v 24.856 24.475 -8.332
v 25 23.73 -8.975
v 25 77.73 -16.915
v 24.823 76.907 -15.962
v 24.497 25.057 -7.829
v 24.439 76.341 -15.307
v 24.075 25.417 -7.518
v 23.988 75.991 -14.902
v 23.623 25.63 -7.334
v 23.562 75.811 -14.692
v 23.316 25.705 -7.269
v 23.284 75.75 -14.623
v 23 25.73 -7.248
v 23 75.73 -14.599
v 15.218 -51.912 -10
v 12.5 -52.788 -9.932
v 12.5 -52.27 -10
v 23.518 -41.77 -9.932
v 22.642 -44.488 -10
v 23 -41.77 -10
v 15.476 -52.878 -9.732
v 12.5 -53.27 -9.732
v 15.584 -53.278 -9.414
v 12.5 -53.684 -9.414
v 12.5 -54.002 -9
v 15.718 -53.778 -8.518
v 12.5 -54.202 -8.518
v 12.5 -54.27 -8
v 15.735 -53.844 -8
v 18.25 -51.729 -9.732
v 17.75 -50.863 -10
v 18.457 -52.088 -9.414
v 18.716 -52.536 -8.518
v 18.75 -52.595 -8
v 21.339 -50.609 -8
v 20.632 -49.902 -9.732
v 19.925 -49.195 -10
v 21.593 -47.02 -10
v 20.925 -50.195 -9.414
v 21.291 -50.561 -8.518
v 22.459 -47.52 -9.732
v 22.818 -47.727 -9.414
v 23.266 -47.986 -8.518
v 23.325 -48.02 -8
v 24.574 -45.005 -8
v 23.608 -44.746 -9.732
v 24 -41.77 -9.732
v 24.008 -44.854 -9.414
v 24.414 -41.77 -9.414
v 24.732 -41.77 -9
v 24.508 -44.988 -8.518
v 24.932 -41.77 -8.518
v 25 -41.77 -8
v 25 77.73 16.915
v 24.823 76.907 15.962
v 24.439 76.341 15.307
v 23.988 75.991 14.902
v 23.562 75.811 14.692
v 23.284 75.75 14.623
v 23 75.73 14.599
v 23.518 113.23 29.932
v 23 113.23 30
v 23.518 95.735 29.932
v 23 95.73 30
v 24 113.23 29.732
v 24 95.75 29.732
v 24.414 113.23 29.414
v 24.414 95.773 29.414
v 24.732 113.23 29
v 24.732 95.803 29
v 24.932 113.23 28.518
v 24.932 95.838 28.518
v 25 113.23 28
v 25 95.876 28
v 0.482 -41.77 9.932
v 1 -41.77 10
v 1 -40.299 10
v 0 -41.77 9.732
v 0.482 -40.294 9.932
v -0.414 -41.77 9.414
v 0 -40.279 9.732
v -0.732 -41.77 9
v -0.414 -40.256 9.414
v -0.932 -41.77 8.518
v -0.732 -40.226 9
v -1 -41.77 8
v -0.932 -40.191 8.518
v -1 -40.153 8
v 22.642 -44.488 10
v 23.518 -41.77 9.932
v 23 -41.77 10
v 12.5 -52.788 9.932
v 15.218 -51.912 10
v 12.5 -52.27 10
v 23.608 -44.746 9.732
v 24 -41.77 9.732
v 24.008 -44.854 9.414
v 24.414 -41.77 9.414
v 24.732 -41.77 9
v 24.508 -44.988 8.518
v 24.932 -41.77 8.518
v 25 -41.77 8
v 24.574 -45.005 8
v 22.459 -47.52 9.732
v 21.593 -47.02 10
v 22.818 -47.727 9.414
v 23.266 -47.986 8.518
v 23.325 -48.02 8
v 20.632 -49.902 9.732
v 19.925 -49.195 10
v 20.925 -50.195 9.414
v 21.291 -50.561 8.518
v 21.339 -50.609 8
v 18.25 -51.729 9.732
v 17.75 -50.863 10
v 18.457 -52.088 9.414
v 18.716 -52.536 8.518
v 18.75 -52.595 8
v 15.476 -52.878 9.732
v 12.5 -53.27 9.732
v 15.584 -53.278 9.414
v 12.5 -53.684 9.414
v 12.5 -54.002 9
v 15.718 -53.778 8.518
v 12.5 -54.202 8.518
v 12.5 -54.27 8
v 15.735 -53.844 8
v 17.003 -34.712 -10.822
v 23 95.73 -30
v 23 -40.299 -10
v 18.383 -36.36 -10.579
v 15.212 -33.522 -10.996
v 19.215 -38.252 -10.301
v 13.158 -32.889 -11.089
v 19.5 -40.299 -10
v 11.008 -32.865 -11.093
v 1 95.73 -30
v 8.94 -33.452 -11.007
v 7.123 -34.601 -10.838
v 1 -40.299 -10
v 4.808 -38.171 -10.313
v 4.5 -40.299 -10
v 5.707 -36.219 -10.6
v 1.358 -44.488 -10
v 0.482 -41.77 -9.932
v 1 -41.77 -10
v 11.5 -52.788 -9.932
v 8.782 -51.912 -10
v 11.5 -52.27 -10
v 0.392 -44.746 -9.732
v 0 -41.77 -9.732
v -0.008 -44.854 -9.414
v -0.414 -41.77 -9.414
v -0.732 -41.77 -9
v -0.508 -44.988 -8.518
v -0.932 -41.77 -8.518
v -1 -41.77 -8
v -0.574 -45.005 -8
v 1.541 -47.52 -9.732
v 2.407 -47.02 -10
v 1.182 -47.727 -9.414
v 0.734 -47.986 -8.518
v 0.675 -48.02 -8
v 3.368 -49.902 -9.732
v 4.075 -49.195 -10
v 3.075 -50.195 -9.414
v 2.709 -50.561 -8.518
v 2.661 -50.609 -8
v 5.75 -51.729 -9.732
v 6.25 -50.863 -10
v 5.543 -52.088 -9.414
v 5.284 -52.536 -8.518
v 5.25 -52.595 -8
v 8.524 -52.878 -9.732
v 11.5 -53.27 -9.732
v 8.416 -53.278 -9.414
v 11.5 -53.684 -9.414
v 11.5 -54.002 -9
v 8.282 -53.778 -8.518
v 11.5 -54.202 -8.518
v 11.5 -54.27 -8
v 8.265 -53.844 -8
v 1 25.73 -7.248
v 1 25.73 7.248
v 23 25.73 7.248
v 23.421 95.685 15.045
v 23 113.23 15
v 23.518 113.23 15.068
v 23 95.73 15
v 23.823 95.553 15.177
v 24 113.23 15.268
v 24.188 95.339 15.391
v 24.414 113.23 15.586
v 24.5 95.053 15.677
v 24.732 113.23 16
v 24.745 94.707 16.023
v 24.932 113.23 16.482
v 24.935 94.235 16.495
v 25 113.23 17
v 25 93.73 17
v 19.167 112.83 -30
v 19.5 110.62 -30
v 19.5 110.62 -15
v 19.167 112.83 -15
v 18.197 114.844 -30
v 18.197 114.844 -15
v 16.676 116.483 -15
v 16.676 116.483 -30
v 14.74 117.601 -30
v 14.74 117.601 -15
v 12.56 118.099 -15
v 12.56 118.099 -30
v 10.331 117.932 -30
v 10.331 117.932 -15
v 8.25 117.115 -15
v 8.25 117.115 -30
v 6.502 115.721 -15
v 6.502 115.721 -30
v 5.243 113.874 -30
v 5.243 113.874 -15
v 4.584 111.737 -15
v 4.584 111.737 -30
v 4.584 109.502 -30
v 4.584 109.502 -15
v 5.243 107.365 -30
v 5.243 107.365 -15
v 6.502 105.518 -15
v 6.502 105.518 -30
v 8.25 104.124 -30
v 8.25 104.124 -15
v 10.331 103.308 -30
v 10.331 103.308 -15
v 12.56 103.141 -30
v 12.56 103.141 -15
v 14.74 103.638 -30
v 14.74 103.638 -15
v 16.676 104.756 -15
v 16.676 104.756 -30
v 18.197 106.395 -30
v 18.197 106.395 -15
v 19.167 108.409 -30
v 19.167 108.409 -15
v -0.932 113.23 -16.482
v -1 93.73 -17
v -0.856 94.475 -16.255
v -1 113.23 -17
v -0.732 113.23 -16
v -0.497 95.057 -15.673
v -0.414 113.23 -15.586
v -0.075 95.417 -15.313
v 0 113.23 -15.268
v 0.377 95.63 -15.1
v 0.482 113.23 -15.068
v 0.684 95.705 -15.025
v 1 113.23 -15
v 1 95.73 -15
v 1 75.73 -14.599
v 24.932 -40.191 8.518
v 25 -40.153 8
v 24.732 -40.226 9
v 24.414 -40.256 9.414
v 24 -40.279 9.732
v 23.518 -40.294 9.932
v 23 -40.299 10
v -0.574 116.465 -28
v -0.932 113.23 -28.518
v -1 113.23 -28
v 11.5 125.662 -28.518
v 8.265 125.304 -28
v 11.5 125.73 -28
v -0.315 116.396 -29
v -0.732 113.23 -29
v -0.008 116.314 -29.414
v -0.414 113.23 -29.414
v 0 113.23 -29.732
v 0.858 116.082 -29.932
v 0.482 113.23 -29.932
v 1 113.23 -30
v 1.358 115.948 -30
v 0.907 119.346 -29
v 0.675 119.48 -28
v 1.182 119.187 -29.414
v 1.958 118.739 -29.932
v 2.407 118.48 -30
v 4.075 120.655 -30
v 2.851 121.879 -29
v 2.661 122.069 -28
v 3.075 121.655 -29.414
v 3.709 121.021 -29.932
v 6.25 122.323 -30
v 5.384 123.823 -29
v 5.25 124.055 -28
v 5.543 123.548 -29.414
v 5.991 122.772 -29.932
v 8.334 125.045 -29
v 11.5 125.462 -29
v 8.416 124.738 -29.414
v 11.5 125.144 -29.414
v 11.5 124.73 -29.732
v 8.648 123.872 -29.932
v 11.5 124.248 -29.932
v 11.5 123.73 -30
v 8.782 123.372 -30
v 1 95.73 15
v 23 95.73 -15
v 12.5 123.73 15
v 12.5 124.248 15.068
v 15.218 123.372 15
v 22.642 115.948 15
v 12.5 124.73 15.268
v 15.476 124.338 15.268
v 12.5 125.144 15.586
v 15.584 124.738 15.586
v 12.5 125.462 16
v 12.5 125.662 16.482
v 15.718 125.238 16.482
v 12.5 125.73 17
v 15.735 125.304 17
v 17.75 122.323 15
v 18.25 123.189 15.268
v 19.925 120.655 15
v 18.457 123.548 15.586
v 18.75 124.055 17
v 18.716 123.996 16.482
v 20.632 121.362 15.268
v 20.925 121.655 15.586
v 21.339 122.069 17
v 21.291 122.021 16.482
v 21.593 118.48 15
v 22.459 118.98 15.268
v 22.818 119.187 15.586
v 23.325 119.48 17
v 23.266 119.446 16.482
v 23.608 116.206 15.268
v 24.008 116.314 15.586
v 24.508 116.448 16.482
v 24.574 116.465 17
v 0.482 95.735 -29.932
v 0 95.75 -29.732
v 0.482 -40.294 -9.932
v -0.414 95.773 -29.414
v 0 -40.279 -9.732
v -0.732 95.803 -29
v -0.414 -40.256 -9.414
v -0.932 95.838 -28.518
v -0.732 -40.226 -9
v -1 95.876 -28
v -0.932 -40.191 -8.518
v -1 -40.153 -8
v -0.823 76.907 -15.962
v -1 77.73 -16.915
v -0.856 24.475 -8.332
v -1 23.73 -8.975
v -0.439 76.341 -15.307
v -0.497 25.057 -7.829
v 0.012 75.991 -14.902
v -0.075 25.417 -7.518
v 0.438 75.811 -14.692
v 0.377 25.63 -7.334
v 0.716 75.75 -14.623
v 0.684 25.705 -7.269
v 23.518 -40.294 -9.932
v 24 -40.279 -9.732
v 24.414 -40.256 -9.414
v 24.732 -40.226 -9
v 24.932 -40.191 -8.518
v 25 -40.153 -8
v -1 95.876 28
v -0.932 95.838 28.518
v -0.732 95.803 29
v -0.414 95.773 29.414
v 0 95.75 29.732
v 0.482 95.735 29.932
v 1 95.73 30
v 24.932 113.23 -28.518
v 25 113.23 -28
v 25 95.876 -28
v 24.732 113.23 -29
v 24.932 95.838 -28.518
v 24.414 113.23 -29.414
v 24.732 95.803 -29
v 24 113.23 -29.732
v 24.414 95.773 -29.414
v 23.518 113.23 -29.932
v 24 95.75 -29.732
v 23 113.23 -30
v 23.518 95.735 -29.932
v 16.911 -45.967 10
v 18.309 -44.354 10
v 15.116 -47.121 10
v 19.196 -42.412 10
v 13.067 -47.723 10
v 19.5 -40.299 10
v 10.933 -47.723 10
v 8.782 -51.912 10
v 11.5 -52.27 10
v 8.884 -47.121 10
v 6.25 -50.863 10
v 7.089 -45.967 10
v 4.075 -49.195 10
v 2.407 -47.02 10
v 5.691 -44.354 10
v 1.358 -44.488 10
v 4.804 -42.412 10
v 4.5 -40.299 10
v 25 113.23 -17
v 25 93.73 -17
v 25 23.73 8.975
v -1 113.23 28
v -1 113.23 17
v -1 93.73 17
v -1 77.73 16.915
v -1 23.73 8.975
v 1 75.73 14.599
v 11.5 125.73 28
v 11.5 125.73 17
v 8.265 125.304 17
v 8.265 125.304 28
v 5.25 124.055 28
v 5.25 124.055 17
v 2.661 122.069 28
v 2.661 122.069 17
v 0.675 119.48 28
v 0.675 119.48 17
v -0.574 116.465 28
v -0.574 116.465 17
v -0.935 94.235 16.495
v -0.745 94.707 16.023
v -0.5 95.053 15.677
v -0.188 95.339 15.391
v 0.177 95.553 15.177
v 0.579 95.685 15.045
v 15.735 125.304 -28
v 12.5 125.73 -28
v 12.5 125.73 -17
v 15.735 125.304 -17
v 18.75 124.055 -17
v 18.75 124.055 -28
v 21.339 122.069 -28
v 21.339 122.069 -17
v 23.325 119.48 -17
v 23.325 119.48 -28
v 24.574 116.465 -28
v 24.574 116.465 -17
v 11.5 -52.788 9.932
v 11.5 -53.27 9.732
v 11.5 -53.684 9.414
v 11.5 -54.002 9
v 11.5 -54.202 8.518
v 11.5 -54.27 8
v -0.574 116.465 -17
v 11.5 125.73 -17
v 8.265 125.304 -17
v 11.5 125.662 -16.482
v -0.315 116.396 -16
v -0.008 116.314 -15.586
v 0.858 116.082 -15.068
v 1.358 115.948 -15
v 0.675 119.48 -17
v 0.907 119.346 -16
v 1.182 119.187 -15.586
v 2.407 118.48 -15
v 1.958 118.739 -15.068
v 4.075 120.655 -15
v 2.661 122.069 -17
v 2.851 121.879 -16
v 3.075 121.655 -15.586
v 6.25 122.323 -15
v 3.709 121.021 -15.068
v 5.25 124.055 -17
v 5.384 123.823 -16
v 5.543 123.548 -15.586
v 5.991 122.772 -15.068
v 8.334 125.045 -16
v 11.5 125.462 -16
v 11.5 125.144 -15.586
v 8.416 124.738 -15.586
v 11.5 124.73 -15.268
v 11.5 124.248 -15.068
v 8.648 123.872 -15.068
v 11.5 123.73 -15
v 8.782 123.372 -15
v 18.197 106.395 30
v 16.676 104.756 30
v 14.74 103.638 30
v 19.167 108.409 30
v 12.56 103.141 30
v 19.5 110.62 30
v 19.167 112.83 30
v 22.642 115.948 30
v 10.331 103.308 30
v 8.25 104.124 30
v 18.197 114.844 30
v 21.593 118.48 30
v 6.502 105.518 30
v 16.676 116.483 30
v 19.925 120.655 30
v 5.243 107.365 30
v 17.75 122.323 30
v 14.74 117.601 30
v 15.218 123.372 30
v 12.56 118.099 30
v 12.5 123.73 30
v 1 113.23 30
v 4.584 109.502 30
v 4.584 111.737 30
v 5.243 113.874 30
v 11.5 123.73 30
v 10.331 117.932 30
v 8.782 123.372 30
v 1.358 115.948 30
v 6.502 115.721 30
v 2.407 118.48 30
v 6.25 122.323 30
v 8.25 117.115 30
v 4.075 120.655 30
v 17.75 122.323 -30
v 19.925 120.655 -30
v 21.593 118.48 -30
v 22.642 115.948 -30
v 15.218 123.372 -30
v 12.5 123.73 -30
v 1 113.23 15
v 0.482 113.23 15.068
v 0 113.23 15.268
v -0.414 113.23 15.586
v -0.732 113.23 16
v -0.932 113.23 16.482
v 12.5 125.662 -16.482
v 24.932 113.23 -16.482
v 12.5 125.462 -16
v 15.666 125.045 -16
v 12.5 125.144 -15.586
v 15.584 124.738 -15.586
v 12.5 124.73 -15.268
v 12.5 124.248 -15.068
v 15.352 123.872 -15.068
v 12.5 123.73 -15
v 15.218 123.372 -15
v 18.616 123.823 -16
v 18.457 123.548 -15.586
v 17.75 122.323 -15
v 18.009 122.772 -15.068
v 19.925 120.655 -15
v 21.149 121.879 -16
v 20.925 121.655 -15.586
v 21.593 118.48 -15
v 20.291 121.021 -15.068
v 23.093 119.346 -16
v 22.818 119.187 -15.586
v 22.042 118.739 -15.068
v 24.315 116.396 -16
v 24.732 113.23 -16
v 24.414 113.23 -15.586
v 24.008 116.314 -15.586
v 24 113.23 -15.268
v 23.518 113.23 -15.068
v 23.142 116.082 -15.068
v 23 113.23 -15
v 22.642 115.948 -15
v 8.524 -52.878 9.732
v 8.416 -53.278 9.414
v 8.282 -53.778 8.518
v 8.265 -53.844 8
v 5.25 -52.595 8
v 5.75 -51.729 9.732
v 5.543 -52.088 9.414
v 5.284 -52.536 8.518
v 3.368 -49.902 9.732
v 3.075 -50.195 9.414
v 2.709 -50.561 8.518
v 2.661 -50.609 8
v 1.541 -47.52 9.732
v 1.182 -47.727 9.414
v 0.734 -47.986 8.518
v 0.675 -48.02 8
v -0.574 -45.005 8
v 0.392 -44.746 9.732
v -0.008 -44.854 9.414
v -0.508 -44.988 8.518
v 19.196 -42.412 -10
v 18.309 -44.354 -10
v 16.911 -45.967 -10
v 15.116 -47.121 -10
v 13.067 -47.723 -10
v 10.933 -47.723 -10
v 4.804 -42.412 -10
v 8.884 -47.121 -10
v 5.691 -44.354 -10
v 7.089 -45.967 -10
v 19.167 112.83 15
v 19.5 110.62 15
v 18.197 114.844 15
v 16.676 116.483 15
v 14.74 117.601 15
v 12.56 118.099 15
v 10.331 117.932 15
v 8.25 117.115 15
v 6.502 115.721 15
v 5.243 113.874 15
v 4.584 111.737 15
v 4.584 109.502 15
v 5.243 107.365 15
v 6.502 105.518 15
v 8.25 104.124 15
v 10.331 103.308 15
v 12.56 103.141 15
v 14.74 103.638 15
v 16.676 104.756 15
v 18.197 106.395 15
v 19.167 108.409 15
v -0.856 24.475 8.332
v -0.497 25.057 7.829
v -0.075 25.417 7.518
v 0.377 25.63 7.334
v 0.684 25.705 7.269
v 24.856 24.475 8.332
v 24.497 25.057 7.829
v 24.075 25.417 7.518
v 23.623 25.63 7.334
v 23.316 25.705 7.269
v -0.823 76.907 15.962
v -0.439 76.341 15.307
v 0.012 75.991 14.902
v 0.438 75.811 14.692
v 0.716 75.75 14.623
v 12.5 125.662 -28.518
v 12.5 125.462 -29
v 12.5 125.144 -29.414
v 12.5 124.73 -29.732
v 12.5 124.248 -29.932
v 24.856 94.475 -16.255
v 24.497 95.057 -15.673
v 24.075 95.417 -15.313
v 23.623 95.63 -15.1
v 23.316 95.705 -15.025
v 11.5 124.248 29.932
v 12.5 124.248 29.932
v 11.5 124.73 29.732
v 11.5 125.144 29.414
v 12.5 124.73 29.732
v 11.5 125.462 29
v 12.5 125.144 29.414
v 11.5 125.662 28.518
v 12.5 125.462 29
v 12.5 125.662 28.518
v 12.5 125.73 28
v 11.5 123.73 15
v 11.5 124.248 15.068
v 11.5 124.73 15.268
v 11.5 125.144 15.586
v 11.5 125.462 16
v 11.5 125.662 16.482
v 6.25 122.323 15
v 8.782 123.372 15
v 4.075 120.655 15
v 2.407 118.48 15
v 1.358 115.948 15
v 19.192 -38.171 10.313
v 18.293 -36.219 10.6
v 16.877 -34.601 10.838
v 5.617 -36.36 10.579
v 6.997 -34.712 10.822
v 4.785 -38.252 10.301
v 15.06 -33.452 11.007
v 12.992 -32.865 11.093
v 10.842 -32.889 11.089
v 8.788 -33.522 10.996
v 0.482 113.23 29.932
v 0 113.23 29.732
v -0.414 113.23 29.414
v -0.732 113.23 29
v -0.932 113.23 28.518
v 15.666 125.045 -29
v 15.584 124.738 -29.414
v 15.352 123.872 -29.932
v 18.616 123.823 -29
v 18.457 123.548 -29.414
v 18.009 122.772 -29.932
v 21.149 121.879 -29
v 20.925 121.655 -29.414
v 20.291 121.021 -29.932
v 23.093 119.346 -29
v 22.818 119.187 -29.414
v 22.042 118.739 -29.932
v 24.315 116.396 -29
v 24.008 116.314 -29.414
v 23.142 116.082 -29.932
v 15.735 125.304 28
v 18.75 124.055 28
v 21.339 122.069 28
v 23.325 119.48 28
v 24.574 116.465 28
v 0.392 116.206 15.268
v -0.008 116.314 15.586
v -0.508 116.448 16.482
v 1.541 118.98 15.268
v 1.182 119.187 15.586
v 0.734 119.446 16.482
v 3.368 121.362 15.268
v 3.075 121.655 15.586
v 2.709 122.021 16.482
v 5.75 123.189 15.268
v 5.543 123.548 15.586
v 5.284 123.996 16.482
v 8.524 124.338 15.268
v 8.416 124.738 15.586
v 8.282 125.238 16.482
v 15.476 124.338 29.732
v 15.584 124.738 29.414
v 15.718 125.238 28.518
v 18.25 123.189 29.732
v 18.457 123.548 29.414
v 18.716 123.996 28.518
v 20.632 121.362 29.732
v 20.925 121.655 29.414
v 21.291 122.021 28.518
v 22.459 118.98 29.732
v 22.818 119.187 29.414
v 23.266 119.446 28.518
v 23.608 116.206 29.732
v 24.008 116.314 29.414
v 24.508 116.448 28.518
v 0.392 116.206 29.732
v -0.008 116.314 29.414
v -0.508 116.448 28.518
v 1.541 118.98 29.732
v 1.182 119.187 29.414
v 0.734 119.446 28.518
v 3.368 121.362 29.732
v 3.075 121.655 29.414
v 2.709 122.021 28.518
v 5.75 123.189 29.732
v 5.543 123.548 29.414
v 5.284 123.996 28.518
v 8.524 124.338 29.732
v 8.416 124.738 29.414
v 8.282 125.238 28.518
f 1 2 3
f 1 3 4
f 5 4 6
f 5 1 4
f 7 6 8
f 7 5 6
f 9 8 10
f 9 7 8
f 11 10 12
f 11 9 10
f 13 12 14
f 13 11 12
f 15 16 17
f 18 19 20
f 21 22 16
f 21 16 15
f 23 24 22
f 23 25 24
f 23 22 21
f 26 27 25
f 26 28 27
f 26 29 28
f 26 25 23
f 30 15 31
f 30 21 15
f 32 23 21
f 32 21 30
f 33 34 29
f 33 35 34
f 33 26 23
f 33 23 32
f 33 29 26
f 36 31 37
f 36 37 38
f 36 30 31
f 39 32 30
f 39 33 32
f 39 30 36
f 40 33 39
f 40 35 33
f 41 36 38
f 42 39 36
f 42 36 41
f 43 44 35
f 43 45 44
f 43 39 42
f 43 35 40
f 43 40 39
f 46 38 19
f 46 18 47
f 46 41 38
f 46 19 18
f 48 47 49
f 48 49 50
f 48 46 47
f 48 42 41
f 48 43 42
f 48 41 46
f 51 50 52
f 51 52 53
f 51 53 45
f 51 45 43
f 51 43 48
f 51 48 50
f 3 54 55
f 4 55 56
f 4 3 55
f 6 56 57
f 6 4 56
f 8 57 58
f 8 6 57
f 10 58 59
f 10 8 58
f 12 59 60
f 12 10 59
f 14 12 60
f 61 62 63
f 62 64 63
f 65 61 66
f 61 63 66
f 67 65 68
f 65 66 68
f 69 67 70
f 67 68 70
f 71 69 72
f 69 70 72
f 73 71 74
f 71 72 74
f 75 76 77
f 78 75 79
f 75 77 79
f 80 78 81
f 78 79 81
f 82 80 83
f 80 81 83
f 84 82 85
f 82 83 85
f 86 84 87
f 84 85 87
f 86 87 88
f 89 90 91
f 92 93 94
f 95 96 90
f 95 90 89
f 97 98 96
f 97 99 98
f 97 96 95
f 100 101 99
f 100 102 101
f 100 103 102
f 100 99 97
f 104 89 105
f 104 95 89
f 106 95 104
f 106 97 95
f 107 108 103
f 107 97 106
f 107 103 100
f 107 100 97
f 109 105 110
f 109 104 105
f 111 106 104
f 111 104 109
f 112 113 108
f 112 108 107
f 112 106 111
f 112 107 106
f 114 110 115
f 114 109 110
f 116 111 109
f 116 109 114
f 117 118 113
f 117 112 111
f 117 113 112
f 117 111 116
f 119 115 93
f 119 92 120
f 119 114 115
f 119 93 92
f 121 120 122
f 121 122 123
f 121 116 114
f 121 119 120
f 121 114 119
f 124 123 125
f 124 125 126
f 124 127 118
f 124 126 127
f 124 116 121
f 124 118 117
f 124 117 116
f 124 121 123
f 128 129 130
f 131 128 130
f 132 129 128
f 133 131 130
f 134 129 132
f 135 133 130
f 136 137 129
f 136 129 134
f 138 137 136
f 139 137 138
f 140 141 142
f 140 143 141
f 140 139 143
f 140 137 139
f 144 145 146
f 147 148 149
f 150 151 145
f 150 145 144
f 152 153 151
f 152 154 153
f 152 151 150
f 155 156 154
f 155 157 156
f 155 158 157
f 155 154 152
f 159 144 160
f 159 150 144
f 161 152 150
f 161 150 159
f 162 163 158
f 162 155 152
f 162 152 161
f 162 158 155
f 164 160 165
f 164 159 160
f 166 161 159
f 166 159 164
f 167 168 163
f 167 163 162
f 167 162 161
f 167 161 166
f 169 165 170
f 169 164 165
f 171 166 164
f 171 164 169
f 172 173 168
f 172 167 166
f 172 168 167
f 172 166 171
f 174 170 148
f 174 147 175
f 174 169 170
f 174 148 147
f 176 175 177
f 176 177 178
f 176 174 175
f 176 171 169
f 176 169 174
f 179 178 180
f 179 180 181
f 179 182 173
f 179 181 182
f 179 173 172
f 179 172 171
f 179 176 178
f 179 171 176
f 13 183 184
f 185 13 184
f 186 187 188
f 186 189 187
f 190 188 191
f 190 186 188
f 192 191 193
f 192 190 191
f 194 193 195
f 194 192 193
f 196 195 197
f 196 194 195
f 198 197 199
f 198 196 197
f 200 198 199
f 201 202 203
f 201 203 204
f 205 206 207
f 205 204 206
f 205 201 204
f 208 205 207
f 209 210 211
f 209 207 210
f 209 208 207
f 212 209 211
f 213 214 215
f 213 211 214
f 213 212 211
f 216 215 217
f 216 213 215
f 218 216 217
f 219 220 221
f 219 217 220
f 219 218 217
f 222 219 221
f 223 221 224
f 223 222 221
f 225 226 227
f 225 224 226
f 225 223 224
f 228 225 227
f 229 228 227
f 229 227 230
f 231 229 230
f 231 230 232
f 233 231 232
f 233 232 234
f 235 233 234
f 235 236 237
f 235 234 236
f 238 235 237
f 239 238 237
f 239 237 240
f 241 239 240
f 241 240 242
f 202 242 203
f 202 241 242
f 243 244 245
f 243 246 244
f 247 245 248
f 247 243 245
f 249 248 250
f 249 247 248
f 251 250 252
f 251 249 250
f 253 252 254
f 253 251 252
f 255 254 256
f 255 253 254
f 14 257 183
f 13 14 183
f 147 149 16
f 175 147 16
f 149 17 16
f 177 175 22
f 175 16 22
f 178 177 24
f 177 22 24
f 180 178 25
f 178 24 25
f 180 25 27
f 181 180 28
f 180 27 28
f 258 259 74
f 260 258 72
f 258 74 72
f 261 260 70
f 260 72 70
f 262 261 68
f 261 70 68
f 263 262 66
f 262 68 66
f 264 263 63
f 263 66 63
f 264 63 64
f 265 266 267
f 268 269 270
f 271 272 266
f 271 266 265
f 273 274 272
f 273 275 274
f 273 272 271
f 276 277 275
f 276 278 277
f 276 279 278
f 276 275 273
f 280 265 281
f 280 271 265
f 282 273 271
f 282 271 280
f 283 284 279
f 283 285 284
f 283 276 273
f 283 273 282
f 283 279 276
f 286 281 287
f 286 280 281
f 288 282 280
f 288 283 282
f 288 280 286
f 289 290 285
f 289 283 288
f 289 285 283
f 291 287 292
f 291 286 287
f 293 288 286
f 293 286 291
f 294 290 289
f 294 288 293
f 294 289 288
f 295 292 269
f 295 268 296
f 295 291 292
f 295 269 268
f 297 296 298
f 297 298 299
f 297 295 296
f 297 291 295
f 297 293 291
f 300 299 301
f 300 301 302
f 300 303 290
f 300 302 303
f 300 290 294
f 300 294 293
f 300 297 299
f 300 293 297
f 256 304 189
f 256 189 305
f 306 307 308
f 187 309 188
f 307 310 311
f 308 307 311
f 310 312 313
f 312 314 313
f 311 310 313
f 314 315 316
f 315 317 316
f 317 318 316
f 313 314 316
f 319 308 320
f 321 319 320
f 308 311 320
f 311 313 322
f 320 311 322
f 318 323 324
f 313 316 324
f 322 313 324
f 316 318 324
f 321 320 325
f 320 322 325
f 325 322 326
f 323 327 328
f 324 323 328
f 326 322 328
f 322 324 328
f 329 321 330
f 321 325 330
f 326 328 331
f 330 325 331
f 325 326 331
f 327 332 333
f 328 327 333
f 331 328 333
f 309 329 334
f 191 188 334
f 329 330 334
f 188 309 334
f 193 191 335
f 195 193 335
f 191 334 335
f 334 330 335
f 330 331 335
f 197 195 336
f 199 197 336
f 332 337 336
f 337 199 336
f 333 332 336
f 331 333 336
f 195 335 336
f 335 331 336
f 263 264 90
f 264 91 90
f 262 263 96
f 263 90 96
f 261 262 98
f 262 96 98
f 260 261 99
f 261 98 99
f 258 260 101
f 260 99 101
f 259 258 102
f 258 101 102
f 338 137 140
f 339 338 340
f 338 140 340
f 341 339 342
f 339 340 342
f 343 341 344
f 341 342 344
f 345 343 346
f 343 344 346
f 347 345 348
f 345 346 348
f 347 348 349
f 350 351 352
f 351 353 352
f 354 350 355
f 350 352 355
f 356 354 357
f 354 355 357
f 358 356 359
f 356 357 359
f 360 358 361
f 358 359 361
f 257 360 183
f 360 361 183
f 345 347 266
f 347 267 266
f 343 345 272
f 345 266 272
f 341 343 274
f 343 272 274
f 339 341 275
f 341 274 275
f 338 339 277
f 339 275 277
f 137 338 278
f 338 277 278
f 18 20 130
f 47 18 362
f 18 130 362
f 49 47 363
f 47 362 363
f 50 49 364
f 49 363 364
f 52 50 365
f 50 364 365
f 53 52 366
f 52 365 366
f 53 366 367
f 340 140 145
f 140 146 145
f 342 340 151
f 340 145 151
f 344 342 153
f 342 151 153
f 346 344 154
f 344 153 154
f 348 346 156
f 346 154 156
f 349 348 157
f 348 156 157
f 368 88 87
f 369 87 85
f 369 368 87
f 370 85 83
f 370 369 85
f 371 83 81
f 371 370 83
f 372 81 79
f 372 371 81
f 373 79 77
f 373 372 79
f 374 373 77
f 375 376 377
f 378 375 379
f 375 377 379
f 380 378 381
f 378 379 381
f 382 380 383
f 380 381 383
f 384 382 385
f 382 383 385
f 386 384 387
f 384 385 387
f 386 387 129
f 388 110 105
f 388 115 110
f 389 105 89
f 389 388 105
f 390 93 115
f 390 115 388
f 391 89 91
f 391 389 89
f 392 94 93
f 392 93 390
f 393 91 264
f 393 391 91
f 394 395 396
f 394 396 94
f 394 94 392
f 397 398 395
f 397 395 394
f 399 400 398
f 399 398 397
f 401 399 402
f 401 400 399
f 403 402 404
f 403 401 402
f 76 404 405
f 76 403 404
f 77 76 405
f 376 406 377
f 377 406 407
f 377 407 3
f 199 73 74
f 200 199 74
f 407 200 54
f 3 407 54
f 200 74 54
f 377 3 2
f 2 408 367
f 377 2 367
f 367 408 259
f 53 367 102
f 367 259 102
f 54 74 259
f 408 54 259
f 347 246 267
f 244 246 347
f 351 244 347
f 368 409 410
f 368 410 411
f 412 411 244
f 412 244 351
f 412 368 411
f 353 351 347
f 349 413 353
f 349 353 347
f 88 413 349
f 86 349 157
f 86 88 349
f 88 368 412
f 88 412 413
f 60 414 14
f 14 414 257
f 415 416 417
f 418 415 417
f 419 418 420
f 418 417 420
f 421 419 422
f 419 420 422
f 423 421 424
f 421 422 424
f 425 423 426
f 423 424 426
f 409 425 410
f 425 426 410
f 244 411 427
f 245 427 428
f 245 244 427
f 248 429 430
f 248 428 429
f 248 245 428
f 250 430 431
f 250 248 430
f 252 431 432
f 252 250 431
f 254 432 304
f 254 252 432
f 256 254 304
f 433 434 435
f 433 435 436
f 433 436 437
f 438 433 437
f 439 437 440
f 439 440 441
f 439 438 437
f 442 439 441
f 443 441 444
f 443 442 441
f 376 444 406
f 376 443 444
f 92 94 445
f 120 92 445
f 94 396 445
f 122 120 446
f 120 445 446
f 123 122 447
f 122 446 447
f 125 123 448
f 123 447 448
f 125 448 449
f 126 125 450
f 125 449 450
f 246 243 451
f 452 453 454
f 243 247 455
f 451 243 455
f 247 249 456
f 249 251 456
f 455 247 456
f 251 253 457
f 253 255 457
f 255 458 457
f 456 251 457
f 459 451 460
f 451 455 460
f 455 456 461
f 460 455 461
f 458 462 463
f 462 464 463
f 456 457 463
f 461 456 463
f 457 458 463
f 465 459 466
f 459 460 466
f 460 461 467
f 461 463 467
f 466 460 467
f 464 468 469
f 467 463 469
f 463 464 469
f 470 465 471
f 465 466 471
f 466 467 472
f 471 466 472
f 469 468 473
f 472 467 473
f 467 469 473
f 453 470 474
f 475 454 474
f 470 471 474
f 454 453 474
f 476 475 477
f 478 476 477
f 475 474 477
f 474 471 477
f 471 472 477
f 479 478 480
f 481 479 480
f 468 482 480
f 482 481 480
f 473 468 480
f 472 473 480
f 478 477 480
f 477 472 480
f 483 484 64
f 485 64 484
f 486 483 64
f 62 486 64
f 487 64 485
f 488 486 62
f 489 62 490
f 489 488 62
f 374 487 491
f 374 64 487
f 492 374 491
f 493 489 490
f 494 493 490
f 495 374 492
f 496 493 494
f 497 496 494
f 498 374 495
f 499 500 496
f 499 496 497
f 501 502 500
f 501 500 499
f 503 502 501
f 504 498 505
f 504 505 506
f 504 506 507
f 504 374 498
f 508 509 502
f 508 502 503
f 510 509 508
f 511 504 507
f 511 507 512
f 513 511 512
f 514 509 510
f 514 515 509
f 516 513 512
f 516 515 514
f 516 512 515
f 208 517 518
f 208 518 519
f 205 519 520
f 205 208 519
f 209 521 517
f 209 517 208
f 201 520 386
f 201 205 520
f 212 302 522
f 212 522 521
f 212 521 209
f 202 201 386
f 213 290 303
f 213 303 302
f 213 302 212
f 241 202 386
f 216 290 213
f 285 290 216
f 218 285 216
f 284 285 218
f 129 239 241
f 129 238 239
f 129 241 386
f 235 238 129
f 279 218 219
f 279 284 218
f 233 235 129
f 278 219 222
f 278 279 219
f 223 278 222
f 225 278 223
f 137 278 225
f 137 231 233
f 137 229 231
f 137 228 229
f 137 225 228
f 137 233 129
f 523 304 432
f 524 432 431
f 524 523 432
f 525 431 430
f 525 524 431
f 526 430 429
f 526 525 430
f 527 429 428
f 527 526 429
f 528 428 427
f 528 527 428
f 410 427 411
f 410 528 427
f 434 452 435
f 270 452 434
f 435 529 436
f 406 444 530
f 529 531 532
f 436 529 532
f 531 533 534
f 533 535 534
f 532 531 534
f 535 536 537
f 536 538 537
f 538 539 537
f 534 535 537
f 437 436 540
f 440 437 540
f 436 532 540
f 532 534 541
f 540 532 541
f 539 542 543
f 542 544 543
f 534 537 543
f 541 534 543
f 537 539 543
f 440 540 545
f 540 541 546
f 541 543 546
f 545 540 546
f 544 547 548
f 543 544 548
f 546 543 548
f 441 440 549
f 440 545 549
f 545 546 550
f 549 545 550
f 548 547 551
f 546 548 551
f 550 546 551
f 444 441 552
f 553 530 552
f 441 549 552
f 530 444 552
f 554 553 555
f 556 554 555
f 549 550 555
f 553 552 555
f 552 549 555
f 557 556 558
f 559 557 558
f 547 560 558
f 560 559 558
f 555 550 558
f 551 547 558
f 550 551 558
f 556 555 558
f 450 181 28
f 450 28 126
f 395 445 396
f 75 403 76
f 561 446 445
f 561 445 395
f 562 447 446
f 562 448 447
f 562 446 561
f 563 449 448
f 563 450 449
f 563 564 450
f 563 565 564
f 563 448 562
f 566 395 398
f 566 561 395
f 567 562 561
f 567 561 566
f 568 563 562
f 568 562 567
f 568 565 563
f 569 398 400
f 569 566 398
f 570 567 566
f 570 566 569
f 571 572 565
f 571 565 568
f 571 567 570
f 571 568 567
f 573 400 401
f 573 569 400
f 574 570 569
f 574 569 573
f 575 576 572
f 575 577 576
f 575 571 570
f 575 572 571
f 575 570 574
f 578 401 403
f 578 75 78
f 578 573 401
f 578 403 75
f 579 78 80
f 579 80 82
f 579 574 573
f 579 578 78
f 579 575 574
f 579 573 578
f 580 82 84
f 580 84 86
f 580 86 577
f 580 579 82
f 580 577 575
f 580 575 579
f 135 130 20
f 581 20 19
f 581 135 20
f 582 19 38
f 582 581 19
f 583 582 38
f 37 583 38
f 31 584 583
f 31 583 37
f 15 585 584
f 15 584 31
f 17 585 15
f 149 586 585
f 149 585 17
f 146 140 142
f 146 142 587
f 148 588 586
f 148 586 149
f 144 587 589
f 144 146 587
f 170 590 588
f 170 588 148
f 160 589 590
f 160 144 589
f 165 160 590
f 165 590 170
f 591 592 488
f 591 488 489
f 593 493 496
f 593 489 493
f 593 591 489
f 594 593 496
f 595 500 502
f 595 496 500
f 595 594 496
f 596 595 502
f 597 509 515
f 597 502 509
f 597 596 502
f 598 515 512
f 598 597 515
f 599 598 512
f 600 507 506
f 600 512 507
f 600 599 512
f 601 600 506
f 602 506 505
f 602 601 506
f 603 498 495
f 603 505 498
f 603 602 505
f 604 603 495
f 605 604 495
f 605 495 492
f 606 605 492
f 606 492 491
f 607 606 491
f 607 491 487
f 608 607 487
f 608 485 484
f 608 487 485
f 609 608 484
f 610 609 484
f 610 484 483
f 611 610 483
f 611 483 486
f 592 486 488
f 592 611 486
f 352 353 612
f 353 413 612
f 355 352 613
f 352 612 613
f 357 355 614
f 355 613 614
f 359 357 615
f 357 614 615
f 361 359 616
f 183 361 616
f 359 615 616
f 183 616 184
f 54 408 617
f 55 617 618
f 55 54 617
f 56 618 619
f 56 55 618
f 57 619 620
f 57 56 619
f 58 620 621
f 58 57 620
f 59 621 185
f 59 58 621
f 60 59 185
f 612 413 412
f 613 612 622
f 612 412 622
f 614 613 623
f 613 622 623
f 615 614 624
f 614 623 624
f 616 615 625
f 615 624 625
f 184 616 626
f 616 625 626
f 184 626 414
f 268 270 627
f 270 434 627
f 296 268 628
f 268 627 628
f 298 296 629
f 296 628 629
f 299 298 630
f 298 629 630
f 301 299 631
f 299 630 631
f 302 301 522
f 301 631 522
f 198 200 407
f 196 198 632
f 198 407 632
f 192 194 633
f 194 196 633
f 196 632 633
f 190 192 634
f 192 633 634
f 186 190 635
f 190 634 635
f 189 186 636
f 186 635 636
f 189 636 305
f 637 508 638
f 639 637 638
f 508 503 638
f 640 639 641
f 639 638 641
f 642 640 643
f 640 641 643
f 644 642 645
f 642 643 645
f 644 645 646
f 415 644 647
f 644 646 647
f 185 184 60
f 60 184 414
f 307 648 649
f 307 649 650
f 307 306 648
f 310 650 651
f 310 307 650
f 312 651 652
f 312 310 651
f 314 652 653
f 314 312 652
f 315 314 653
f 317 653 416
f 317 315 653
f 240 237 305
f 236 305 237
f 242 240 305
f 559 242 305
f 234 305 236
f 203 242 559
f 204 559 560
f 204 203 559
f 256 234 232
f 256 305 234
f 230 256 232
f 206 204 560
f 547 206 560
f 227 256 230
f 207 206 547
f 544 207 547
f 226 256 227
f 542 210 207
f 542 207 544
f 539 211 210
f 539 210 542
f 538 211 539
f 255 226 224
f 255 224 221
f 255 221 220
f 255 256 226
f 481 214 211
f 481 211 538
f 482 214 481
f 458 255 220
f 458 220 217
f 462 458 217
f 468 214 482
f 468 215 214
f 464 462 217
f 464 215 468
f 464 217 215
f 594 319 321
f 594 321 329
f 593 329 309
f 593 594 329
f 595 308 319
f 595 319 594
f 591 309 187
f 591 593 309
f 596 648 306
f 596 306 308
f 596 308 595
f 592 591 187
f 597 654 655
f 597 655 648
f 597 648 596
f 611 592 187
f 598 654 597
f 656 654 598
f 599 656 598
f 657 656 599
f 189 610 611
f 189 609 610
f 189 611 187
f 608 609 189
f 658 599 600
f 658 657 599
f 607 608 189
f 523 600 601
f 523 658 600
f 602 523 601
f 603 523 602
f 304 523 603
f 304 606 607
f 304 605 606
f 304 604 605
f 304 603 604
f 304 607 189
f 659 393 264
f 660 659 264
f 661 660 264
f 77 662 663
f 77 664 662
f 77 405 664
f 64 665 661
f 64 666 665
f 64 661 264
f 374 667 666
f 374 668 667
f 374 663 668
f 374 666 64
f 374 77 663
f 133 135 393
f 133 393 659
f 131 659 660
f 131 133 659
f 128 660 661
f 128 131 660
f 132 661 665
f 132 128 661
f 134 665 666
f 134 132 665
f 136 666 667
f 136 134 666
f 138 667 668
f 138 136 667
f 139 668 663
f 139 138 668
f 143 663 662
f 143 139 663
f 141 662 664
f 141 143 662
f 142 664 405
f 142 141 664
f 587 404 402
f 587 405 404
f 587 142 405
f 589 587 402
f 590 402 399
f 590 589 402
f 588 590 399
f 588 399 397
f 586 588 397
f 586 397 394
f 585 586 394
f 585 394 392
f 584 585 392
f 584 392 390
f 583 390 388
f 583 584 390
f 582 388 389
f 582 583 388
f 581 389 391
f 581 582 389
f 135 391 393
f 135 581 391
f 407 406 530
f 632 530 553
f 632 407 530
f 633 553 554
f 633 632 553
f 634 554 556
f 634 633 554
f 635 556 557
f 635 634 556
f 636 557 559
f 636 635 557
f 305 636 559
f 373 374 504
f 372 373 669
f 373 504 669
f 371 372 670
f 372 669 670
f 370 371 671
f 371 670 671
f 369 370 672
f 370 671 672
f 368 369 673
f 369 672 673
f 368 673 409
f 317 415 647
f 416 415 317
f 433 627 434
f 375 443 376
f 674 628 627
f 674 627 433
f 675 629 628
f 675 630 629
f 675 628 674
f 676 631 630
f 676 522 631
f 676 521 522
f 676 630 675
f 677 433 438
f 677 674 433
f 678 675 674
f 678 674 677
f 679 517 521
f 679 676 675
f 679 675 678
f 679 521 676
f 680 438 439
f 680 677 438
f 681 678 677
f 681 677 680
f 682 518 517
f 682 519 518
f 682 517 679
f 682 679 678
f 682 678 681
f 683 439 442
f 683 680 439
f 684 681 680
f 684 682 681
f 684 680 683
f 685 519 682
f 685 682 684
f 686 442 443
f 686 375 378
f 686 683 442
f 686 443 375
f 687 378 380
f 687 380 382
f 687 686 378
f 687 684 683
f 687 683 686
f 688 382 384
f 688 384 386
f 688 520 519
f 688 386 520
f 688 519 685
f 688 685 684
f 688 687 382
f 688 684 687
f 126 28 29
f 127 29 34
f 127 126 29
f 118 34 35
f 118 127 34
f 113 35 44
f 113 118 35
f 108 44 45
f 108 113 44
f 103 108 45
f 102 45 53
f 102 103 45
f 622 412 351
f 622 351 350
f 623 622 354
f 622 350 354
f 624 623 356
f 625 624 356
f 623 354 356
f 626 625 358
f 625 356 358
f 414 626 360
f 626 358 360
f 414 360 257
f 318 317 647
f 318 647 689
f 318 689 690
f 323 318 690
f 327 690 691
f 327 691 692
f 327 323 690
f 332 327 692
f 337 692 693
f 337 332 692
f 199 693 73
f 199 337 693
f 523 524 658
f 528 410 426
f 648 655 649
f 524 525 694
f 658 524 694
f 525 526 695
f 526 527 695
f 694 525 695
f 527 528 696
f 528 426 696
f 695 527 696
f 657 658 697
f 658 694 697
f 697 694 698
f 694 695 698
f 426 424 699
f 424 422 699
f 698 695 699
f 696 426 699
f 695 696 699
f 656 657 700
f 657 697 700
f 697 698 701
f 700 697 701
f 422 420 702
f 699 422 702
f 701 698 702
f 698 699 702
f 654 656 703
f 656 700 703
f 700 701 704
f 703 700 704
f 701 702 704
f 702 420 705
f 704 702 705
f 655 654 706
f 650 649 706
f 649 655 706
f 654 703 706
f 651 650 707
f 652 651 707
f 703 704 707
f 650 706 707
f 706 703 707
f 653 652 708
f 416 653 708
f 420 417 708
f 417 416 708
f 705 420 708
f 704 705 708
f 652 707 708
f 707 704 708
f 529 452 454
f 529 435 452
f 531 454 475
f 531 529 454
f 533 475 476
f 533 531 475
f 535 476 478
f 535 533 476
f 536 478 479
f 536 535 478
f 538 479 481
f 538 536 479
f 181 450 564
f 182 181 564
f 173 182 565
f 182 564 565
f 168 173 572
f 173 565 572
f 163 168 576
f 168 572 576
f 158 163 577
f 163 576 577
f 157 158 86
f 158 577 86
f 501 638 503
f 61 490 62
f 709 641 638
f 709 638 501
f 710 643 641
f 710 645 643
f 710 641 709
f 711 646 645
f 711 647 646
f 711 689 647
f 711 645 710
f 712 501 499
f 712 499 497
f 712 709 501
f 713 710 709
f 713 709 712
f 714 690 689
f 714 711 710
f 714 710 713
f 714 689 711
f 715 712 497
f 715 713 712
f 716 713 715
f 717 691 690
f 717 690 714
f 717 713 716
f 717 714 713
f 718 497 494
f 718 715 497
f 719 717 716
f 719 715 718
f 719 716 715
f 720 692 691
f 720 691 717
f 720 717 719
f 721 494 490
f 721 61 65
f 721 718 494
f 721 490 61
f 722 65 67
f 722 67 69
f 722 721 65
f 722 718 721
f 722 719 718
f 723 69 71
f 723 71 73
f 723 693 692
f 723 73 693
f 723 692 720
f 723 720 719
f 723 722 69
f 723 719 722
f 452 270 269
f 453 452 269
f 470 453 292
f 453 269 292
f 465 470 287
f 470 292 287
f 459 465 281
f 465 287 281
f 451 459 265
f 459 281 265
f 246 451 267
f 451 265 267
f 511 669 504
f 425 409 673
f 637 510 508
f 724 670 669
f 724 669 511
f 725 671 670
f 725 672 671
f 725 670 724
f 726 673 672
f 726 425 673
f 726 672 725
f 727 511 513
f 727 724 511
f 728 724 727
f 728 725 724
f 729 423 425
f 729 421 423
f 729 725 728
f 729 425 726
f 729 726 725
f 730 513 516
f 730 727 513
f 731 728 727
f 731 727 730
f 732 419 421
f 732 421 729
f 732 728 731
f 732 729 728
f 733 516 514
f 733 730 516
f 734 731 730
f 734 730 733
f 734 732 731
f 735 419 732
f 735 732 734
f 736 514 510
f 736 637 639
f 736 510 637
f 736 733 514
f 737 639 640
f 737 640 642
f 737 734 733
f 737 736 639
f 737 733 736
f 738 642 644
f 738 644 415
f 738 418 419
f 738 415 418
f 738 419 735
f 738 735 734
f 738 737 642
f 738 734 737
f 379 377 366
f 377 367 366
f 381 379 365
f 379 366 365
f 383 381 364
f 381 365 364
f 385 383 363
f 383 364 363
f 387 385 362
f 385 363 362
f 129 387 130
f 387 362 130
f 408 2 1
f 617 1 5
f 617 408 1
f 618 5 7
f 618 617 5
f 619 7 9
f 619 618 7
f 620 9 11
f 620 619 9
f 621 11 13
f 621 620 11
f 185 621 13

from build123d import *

# Parameters (mm, degrees)
BOSS_EXTRUDE1_DEPTH      = 25
BOSS_EXTRUDE1_DEPTH_BACK = 1
FILLET1_R                = 12.5
CUT_EXTRUDE3_DEPTH       = 132.655011329
CUT_EXTRUDE3_DEPTH_BACK  = 132.655011329
SKETCH3_R                = 7.5
FILLET4_R                = 2


with BuildPart() as part:
    # Sketch1 → Boss-Extrude1 (new, two sides: drawn at the far end of the back side and taken through both)
    with BuildSketch(Plane.YZ.offset(-BOSS_EXTRUDE1_DEPTH_BACK)):
        Polygon((-54.26996378, -10), (-54.26996378, 10), (-40.299013823, 10), (95.73003622, 30), (125.73003622, 30), (125.73003622, 15), (95.73003622, 15), (95.73003622, -15), (125.73003622, -15), (125.73003622, -30), (95.73003622, -30), (-40.299013823, -10), align=None)
        Polygon((25.73003622, -7.247706801), (25.73003622, 7.247706801), (75.73003622, 14.599077701), (75.73003622, -14.599077701), align=None, mode=Mode.SUBTRACT)
    extrude(amount=BOSS_EXTRUDE1_DEPTH + BOSS_EXTRUDE1_DEPTH_BACK)

    # Fillet1
    fillet1_edges = [part.edges().sort_by_distance(p)[0] for p in [
        (25, 125.73003622, -22.5),
        (25, -54.26996378, 0),
        (-1, 125.73003622, -22.5),
        (-1, -54.26996378, 0),
        (25, 125.73003622, 22.5),
        (-1, 125.73003622, 22.5),
    ]]
    fillet(fillet1_edges, radius=FILLET1_R)

    # Sketch3 → Cut-Extrude3 (cut, two sides: drawn at the far end of the back side and taken through both)
    with BuildSketch(Plane(origin=(0, 0, 0), x_dir=(0, 1, 0), z_dir=(0, 0, 1)).offset(-CUT_EXTRUDE3_DEPTH_BACK)):
        with Locations(Location((-40.299013823, -12, 0), (0, 0, 270))):
            Circle(SKETCH3_R)
        with Locations(Location((110.619547971, -12, 0), (0, 0, 270))):
            Circle(SKETCH3_R)
    extrude(amount=CUT_EXTRUDE3_DEPTH + CUT_EXTRUDE3_DEPTH_BACK, mode=Mode.SUBTRACT)

    # Fillet4
    fillet4_edges = [part.edges().sort_by_distance(p)[0] for p in [
        (12, 125.73003622, 15),
        (21.338834765, 122.068870985, 15),
        (2.661165235, 122.068870985, 15),
        (12, 125.73003622, 30),
        (21.338834765, 122.068870985, 30),
        (2.661165235, 122.068870985, 30),
        (25, 104.48003622, -30),
        (25, 27.715511199, -20),
        (25, 75.73003622, 0),
        (25, 50.73003622, 10.923392251),
        (25, 25.73003622, 0),
        (25, 50.73003622, -10.923392251),
        (25, 27.715511199, 20),
        (-1, 104.48003622, -30),
        (-1, 27.715511199, -20),
        (25, 104.48003622, 30),
        (-1, 50.73003622, -10.923392251),
        (-1, 95.73003622, 0),
        (-1, 27.715511199, 20),
        (-1, 104.48003622, 30),
        (-1, 25.73003622, 0),
        (-1, 50.73003622, 10.923392251),
        (-1, 75.73003622, 0),
        (-1, 104.48003622, 15),
        (-1, 104.48003622, -15),
        (-1, -41.034488801, -10),
        (-1, -41.034488801, 10),
        (12, -54.26996378, 10),
        (25, -41.034488801, 10),
        (21.338834765, -50.608798545, 10),
        (2.661165235, -50.608798545, 10),
        (12, -54.26996378, -10),
        (25, 95.73003622, 0),
        (25, -41.034488801, -10),
        (21.338834765, -50.608798545, -10),
        (2.661165235, -50.608798545, -10),
        (25, 104.48003622, 15),
        (25, 104.48003622, -15),
        (12, 125.73003622, -30),
        (12, 125.73003622, -15),
        (21.338834765, 122.068870985, -15),
        (2.661165235, 122.068870985, -15),
        (21.338834765, 122.068870985, -30),
        (2.661165235, 122.068870985, -30),
    ]]
    fillet(fillet4_edges, radius=FILLET4_R)


solid = part.part
